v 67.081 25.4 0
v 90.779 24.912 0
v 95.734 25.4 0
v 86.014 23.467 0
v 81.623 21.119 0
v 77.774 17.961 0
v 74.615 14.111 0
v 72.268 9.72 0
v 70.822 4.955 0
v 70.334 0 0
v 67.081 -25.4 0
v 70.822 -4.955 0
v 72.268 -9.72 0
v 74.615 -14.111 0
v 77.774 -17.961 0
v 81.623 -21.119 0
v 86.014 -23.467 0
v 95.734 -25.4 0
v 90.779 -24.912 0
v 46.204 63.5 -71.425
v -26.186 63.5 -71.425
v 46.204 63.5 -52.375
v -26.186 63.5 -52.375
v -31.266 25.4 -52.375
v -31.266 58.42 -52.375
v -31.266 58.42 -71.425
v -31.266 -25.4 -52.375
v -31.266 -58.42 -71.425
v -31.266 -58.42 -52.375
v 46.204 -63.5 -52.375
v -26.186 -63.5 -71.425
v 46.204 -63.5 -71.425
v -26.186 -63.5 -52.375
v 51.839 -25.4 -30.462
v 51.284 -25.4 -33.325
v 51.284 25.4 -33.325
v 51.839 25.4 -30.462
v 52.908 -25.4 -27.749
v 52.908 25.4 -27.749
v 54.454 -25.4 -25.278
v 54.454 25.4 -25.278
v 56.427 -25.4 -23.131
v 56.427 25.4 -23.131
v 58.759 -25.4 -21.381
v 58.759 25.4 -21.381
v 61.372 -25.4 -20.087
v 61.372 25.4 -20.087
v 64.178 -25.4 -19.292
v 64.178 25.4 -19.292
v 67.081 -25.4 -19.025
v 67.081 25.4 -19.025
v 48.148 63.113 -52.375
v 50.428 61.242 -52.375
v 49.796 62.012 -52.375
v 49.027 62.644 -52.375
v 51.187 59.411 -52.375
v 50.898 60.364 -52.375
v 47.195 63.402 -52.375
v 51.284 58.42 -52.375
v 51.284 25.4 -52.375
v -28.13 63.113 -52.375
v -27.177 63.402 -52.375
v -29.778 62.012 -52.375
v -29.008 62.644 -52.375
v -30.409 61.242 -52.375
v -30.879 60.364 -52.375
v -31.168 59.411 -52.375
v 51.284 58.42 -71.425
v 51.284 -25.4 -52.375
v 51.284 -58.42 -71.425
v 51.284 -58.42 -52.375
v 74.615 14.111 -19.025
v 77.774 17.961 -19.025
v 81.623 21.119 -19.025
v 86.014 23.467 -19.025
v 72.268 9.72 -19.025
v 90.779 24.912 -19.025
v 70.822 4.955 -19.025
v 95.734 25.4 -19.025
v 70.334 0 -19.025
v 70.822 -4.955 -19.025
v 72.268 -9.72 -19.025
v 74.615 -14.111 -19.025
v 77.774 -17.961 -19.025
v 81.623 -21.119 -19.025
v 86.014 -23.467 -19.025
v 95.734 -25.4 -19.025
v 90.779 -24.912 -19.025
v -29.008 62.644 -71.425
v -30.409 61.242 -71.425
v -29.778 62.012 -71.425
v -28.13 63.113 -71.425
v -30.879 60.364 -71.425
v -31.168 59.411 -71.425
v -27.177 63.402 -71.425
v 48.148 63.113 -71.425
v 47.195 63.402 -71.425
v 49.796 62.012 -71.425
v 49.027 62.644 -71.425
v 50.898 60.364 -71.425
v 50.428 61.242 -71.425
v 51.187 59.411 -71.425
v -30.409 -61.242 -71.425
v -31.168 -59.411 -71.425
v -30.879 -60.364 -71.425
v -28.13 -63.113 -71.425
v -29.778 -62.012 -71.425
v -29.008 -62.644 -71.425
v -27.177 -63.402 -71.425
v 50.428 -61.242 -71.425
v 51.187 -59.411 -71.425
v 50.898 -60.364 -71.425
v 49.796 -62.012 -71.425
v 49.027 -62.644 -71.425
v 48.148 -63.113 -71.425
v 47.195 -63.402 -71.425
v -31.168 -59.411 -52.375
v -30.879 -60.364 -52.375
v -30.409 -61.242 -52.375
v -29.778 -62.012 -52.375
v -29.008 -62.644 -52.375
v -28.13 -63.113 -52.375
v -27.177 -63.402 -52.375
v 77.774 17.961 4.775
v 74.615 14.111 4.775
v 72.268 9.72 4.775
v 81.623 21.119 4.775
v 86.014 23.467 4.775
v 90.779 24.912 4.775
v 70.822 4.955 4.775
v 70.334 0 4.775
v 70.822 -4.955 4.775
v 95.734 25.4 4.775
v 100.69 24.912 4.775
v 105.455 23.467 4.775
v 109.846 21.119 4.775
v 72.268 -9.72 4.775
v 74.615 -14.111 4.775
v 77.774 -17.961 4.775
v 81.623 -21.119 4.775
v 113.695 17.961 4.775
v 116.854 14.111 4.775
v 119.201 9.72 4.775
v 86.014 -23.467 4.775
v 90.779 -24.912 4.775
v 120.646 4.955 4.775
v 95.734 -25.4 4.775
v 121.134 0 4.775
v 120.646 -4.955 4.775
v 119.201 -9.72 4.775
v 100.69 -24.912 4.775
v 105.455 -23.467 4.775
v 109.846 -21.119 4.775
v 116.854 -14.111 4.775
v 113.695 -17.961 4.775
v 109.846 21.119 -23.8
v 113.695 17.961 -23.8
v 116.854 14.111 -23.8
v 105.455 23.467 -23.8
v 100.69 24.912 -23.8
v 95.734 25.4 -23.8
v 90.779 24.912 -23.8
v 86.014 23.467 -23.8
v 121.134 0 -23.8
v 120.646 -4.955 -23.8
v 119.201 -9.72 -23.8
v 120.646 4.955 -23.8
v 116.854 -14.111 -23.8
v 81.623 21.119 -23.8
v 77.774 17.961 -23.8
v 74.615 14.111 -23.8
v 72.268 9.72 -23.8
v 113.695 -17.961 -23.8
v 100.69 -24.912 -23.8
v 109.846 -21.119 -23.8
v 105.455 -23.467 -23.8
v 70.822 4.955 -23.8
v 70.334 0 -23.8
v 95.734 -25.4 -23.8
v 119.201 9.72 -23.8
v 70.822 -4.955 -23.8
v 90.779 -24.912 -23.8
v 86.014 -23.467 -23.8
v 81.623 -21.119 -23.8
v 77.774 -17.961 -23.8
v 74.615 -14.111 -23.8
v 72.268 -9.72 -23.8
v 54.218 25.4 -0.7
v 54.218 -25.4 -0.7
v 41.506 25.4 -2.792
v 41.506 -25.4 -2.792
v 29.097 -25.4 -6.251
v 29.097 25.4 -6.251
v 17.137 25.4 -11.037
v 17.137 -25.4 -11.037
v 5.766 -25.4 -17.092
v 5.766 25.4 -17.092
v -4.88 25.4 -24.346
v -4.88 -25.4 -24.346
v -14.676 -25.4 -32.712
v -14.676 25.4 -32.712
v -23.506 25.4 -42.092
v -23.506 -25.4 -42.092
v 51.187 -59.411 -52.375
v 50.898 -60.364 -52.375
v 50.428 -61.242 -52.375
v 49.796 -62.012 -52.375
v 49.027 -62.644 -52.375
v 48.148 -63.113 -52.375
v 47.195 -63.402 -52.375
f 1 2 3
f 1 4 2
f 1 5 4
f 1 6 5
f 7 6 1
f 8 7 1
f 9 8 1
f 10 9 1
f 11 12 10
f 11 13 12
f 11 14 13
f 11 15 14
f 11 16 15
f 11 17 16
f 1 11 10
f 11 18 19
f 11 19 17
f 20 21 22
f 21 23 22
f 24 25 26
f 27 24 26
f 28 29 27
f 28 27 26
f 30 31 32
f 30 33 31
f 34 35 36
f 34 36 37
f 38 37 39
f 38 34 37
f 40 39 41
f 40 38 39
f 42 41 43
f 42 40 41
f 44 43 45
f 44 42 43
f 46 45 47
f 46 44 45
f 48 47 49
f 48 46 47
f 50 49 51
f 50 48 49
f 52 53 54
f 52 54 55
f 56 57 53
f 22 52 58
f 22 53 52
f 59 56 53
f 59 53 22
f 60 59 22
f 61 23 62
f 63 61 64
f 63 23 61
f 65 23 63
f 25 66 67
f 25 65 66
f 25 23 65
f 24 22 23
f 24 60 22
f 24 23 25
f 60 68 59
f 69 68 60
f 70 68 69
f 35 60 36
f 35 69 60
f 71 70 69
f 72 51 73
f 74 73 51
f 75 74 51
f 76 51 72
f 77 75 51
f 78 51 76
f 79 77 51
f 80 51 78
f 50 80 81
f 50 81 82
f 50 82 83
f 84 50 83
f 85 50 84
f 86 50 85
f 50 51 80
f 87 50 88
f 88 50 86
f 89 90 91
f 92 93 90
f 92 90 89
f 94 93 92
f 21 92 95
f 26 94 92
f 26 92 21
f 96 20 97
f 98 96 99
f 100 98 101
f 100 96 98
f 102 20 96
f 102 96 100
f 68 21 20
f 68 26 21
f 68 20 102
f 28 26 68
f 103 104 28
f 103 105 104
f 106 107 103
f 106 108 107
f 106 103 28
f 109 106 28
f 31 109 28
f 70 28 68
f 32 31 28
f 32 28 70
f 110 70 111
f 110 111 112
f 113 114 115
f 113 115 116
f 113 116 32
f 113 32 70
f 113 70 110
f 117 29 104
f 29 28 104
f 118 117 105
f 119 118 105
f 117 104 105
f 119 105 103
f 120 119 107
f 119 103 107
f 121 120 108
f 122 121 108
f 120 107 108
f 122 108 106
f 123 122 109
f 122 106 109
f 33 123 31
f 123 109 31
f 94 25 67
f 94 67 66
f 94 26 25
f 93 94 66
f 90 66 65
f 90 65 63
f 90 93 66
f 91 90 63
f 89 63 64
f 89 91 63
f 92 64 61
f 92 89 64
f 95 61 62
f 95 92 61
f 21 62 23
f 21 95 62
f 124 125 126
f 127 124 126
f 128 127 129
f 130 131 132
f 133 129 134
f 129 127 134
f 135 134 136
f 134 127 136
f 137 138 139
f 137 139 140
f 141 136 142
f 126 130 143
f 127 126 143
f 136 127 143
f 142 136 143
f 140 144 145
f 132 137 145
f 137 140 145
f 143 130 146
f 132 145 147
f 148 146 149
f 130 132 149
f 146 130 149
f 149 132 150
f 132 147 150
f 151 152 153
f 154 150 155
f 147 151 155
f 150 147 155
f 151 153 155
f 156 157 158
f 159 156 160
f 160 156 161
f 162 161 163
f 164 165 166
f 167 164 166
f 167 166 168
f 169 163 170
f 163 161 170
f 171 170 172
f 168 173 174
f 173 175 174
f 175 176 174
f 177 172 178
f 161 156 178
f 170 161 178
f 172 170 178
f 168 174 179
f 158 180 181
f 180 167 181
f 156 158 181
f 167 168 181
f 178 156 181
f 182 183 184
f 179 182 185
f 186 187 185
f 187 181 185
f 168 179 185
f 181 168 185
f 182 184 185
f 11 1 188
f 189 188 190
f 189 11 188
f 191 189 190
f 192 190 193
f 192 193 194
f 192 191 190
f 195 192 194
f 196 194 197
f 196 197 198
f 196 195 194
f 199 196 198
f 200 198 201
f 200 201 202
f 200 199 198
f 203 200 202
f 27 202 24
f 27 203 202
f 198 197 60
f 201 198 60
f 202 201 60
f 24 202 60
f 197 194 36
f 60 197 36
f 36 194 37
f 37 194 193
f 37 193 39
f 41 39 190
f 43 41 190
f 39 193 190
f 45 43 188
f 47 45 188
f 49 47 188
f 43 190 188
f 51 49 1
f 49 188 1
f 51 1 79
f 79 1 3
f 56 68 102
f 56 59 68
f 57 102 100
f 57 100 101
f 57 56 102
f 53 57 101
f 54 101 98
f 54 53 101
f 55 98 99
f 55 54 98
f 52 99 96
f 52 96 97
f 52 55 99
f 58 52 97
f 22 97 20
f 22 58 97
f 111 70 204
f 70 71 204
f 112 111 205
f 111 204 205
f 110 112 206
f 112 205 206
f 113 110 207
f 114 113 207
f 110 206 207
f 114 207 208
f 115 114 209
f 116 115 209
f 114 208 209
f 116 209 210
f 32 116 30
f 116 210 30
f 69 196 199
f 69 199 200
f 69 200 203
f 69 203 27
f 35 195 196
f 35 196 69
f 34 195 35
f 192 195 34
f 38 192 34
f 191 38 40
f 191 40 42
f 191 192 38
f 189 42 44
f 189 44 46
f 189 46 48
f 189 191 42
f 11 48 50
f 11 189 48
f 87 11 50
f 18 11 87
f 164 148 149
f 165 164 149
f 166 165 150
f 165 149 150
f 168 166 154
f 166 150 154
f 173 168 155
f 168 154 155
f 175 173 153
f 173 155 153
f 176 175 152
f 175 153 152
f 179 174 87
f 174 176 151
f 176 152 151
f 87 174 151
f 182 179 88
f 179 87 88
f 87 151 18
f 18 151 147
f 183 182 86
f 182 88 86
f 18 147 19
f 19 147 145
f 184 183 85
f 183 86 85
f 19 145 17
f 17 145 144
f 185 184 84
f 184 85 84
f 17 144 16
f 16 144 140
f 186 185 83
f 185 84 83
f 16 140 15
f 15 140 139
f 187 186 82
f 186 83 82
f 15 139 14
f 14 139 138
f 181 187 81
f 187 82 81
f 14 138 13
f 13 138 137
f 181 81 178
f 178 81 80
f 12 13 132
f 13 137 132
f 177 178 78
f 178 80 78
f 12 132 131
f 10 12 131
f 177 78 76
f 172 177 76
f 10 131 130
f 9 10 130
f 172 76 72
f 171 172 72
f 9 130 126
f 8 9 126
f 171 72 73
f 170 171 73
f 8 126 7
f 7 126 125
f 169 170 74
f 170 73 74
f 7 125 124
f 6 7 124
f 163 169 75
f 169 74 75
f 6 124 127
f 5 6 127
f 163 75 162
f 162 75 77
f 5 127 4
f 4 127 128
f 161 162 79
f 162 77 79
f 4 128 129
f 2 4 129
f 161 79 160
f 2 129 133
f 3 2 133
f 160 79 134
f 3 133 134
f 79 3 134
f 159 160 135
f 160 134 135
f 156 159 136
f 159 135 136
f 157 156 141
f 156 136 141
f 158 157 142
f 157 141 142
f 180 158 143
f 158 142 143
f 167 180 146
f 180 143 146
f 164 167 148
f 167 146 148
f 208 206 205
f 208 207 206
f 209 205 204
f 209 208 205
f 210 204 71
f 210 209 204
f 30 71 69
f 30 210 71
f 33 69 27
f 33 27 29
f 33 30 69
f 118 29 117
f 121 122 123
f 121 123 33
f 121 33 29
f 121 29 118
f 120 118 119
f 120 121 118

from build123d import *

# Parameters (mm, degrees)
F1_DEPTH = 63.5
F0_W     = 19.05
F0_H     = 19.05
F0_W_2   = 3.2533031947
F0_H_2   = 19.0246
F0_W_3   = 25.4
F2_DEPTH = 25.4
F4_R     = 5.08


with BuildPart() as f1:
    # F0 (on Front) → F1 (new body, symmetric)
    with BuildSketch(Plane.XZ):
        Polygon((32.2343749046, -52.3748), (-31.2656250954, -52.3748), (-31.2656250954, -71.4248), (51.2843749046, -71.4248), (51.2843749046, -52.3748), align=None)
    extrude(amount=F1_DEPTH, both=True)

    # F0 (on Front) → F2 (join, symmetric)
    with BuildSketch(Plane.XZ):
        with BuildLine():
            ThreePointArc((67.08107171, 0), (11.3693304709, -13.9099433247), (-31.2656250954, -52.3748))
            Line((-31.2656250954, -52.3748), (32.2343749046, -52.3748))
            Line((32.2343749046, -52.3748), (32.2343749046, -33.3248))
            ThreePointArc((32.2343749046, -33.3248), (42.9728025203, -9.6721882708), (67.08107171, 0))
        make_face()
        with BuildLine():
            Line((67.08107171, -19.0246), (67.08107171, 0))
            ThreePointArc((67.08107171, 0), (42.9728025203, -9.6721882708), (32.2343749046, -33.3248))
            Line((32.2343749046, -33.3248), (51.2843749046, -33.3248))
            ThreePointArc((51.2843749046, -33.3248), (56.4270660079, -23.1306668495), (67.08107171, -19.0246))
        make_face()
        with Locations((41.7593749046, -42.8498)):
            Rectangle(F0_W, F0_H)
        with Locations((68.7077233073, -9.5123)):
            Rectangle(F0_W_2, F0_H_2)
        with Locations((83.0343749046, -9.5123)):
            Rectangle(F0_W_3, F0_H_2)
    extrude(amount=F2_DEPTH, both=True)

    # F0 (on Front) → F3 (revolve)
    with BuildSketch(Plane.XZ):
        Polygon((95.7343749046, 4.7752), (95.7343749046, 0), (95.7343749046, -19.0246), (95.7343749046, -23.7998), (121.1343749046, -23.7998), (121.1343749046, 4.7752), align=None)
    revolve(axis=Axis((95.7343749046, 0, -9.5123), (0, 0, -1)))

    # F4
    f4_edges = [f1.edges().sort_by_distance(p)[0] for p in [
        (-31.265625, -63.5, -61.8998),
        (51.284375, -63.5, -61.8998),
        (51.284375, 63.5, -61.8998),
        (-31.265625, 63.5, -61.8998),
    ]]
    fillet(f4_edges, radius=F4_R)


solid = f1.part
